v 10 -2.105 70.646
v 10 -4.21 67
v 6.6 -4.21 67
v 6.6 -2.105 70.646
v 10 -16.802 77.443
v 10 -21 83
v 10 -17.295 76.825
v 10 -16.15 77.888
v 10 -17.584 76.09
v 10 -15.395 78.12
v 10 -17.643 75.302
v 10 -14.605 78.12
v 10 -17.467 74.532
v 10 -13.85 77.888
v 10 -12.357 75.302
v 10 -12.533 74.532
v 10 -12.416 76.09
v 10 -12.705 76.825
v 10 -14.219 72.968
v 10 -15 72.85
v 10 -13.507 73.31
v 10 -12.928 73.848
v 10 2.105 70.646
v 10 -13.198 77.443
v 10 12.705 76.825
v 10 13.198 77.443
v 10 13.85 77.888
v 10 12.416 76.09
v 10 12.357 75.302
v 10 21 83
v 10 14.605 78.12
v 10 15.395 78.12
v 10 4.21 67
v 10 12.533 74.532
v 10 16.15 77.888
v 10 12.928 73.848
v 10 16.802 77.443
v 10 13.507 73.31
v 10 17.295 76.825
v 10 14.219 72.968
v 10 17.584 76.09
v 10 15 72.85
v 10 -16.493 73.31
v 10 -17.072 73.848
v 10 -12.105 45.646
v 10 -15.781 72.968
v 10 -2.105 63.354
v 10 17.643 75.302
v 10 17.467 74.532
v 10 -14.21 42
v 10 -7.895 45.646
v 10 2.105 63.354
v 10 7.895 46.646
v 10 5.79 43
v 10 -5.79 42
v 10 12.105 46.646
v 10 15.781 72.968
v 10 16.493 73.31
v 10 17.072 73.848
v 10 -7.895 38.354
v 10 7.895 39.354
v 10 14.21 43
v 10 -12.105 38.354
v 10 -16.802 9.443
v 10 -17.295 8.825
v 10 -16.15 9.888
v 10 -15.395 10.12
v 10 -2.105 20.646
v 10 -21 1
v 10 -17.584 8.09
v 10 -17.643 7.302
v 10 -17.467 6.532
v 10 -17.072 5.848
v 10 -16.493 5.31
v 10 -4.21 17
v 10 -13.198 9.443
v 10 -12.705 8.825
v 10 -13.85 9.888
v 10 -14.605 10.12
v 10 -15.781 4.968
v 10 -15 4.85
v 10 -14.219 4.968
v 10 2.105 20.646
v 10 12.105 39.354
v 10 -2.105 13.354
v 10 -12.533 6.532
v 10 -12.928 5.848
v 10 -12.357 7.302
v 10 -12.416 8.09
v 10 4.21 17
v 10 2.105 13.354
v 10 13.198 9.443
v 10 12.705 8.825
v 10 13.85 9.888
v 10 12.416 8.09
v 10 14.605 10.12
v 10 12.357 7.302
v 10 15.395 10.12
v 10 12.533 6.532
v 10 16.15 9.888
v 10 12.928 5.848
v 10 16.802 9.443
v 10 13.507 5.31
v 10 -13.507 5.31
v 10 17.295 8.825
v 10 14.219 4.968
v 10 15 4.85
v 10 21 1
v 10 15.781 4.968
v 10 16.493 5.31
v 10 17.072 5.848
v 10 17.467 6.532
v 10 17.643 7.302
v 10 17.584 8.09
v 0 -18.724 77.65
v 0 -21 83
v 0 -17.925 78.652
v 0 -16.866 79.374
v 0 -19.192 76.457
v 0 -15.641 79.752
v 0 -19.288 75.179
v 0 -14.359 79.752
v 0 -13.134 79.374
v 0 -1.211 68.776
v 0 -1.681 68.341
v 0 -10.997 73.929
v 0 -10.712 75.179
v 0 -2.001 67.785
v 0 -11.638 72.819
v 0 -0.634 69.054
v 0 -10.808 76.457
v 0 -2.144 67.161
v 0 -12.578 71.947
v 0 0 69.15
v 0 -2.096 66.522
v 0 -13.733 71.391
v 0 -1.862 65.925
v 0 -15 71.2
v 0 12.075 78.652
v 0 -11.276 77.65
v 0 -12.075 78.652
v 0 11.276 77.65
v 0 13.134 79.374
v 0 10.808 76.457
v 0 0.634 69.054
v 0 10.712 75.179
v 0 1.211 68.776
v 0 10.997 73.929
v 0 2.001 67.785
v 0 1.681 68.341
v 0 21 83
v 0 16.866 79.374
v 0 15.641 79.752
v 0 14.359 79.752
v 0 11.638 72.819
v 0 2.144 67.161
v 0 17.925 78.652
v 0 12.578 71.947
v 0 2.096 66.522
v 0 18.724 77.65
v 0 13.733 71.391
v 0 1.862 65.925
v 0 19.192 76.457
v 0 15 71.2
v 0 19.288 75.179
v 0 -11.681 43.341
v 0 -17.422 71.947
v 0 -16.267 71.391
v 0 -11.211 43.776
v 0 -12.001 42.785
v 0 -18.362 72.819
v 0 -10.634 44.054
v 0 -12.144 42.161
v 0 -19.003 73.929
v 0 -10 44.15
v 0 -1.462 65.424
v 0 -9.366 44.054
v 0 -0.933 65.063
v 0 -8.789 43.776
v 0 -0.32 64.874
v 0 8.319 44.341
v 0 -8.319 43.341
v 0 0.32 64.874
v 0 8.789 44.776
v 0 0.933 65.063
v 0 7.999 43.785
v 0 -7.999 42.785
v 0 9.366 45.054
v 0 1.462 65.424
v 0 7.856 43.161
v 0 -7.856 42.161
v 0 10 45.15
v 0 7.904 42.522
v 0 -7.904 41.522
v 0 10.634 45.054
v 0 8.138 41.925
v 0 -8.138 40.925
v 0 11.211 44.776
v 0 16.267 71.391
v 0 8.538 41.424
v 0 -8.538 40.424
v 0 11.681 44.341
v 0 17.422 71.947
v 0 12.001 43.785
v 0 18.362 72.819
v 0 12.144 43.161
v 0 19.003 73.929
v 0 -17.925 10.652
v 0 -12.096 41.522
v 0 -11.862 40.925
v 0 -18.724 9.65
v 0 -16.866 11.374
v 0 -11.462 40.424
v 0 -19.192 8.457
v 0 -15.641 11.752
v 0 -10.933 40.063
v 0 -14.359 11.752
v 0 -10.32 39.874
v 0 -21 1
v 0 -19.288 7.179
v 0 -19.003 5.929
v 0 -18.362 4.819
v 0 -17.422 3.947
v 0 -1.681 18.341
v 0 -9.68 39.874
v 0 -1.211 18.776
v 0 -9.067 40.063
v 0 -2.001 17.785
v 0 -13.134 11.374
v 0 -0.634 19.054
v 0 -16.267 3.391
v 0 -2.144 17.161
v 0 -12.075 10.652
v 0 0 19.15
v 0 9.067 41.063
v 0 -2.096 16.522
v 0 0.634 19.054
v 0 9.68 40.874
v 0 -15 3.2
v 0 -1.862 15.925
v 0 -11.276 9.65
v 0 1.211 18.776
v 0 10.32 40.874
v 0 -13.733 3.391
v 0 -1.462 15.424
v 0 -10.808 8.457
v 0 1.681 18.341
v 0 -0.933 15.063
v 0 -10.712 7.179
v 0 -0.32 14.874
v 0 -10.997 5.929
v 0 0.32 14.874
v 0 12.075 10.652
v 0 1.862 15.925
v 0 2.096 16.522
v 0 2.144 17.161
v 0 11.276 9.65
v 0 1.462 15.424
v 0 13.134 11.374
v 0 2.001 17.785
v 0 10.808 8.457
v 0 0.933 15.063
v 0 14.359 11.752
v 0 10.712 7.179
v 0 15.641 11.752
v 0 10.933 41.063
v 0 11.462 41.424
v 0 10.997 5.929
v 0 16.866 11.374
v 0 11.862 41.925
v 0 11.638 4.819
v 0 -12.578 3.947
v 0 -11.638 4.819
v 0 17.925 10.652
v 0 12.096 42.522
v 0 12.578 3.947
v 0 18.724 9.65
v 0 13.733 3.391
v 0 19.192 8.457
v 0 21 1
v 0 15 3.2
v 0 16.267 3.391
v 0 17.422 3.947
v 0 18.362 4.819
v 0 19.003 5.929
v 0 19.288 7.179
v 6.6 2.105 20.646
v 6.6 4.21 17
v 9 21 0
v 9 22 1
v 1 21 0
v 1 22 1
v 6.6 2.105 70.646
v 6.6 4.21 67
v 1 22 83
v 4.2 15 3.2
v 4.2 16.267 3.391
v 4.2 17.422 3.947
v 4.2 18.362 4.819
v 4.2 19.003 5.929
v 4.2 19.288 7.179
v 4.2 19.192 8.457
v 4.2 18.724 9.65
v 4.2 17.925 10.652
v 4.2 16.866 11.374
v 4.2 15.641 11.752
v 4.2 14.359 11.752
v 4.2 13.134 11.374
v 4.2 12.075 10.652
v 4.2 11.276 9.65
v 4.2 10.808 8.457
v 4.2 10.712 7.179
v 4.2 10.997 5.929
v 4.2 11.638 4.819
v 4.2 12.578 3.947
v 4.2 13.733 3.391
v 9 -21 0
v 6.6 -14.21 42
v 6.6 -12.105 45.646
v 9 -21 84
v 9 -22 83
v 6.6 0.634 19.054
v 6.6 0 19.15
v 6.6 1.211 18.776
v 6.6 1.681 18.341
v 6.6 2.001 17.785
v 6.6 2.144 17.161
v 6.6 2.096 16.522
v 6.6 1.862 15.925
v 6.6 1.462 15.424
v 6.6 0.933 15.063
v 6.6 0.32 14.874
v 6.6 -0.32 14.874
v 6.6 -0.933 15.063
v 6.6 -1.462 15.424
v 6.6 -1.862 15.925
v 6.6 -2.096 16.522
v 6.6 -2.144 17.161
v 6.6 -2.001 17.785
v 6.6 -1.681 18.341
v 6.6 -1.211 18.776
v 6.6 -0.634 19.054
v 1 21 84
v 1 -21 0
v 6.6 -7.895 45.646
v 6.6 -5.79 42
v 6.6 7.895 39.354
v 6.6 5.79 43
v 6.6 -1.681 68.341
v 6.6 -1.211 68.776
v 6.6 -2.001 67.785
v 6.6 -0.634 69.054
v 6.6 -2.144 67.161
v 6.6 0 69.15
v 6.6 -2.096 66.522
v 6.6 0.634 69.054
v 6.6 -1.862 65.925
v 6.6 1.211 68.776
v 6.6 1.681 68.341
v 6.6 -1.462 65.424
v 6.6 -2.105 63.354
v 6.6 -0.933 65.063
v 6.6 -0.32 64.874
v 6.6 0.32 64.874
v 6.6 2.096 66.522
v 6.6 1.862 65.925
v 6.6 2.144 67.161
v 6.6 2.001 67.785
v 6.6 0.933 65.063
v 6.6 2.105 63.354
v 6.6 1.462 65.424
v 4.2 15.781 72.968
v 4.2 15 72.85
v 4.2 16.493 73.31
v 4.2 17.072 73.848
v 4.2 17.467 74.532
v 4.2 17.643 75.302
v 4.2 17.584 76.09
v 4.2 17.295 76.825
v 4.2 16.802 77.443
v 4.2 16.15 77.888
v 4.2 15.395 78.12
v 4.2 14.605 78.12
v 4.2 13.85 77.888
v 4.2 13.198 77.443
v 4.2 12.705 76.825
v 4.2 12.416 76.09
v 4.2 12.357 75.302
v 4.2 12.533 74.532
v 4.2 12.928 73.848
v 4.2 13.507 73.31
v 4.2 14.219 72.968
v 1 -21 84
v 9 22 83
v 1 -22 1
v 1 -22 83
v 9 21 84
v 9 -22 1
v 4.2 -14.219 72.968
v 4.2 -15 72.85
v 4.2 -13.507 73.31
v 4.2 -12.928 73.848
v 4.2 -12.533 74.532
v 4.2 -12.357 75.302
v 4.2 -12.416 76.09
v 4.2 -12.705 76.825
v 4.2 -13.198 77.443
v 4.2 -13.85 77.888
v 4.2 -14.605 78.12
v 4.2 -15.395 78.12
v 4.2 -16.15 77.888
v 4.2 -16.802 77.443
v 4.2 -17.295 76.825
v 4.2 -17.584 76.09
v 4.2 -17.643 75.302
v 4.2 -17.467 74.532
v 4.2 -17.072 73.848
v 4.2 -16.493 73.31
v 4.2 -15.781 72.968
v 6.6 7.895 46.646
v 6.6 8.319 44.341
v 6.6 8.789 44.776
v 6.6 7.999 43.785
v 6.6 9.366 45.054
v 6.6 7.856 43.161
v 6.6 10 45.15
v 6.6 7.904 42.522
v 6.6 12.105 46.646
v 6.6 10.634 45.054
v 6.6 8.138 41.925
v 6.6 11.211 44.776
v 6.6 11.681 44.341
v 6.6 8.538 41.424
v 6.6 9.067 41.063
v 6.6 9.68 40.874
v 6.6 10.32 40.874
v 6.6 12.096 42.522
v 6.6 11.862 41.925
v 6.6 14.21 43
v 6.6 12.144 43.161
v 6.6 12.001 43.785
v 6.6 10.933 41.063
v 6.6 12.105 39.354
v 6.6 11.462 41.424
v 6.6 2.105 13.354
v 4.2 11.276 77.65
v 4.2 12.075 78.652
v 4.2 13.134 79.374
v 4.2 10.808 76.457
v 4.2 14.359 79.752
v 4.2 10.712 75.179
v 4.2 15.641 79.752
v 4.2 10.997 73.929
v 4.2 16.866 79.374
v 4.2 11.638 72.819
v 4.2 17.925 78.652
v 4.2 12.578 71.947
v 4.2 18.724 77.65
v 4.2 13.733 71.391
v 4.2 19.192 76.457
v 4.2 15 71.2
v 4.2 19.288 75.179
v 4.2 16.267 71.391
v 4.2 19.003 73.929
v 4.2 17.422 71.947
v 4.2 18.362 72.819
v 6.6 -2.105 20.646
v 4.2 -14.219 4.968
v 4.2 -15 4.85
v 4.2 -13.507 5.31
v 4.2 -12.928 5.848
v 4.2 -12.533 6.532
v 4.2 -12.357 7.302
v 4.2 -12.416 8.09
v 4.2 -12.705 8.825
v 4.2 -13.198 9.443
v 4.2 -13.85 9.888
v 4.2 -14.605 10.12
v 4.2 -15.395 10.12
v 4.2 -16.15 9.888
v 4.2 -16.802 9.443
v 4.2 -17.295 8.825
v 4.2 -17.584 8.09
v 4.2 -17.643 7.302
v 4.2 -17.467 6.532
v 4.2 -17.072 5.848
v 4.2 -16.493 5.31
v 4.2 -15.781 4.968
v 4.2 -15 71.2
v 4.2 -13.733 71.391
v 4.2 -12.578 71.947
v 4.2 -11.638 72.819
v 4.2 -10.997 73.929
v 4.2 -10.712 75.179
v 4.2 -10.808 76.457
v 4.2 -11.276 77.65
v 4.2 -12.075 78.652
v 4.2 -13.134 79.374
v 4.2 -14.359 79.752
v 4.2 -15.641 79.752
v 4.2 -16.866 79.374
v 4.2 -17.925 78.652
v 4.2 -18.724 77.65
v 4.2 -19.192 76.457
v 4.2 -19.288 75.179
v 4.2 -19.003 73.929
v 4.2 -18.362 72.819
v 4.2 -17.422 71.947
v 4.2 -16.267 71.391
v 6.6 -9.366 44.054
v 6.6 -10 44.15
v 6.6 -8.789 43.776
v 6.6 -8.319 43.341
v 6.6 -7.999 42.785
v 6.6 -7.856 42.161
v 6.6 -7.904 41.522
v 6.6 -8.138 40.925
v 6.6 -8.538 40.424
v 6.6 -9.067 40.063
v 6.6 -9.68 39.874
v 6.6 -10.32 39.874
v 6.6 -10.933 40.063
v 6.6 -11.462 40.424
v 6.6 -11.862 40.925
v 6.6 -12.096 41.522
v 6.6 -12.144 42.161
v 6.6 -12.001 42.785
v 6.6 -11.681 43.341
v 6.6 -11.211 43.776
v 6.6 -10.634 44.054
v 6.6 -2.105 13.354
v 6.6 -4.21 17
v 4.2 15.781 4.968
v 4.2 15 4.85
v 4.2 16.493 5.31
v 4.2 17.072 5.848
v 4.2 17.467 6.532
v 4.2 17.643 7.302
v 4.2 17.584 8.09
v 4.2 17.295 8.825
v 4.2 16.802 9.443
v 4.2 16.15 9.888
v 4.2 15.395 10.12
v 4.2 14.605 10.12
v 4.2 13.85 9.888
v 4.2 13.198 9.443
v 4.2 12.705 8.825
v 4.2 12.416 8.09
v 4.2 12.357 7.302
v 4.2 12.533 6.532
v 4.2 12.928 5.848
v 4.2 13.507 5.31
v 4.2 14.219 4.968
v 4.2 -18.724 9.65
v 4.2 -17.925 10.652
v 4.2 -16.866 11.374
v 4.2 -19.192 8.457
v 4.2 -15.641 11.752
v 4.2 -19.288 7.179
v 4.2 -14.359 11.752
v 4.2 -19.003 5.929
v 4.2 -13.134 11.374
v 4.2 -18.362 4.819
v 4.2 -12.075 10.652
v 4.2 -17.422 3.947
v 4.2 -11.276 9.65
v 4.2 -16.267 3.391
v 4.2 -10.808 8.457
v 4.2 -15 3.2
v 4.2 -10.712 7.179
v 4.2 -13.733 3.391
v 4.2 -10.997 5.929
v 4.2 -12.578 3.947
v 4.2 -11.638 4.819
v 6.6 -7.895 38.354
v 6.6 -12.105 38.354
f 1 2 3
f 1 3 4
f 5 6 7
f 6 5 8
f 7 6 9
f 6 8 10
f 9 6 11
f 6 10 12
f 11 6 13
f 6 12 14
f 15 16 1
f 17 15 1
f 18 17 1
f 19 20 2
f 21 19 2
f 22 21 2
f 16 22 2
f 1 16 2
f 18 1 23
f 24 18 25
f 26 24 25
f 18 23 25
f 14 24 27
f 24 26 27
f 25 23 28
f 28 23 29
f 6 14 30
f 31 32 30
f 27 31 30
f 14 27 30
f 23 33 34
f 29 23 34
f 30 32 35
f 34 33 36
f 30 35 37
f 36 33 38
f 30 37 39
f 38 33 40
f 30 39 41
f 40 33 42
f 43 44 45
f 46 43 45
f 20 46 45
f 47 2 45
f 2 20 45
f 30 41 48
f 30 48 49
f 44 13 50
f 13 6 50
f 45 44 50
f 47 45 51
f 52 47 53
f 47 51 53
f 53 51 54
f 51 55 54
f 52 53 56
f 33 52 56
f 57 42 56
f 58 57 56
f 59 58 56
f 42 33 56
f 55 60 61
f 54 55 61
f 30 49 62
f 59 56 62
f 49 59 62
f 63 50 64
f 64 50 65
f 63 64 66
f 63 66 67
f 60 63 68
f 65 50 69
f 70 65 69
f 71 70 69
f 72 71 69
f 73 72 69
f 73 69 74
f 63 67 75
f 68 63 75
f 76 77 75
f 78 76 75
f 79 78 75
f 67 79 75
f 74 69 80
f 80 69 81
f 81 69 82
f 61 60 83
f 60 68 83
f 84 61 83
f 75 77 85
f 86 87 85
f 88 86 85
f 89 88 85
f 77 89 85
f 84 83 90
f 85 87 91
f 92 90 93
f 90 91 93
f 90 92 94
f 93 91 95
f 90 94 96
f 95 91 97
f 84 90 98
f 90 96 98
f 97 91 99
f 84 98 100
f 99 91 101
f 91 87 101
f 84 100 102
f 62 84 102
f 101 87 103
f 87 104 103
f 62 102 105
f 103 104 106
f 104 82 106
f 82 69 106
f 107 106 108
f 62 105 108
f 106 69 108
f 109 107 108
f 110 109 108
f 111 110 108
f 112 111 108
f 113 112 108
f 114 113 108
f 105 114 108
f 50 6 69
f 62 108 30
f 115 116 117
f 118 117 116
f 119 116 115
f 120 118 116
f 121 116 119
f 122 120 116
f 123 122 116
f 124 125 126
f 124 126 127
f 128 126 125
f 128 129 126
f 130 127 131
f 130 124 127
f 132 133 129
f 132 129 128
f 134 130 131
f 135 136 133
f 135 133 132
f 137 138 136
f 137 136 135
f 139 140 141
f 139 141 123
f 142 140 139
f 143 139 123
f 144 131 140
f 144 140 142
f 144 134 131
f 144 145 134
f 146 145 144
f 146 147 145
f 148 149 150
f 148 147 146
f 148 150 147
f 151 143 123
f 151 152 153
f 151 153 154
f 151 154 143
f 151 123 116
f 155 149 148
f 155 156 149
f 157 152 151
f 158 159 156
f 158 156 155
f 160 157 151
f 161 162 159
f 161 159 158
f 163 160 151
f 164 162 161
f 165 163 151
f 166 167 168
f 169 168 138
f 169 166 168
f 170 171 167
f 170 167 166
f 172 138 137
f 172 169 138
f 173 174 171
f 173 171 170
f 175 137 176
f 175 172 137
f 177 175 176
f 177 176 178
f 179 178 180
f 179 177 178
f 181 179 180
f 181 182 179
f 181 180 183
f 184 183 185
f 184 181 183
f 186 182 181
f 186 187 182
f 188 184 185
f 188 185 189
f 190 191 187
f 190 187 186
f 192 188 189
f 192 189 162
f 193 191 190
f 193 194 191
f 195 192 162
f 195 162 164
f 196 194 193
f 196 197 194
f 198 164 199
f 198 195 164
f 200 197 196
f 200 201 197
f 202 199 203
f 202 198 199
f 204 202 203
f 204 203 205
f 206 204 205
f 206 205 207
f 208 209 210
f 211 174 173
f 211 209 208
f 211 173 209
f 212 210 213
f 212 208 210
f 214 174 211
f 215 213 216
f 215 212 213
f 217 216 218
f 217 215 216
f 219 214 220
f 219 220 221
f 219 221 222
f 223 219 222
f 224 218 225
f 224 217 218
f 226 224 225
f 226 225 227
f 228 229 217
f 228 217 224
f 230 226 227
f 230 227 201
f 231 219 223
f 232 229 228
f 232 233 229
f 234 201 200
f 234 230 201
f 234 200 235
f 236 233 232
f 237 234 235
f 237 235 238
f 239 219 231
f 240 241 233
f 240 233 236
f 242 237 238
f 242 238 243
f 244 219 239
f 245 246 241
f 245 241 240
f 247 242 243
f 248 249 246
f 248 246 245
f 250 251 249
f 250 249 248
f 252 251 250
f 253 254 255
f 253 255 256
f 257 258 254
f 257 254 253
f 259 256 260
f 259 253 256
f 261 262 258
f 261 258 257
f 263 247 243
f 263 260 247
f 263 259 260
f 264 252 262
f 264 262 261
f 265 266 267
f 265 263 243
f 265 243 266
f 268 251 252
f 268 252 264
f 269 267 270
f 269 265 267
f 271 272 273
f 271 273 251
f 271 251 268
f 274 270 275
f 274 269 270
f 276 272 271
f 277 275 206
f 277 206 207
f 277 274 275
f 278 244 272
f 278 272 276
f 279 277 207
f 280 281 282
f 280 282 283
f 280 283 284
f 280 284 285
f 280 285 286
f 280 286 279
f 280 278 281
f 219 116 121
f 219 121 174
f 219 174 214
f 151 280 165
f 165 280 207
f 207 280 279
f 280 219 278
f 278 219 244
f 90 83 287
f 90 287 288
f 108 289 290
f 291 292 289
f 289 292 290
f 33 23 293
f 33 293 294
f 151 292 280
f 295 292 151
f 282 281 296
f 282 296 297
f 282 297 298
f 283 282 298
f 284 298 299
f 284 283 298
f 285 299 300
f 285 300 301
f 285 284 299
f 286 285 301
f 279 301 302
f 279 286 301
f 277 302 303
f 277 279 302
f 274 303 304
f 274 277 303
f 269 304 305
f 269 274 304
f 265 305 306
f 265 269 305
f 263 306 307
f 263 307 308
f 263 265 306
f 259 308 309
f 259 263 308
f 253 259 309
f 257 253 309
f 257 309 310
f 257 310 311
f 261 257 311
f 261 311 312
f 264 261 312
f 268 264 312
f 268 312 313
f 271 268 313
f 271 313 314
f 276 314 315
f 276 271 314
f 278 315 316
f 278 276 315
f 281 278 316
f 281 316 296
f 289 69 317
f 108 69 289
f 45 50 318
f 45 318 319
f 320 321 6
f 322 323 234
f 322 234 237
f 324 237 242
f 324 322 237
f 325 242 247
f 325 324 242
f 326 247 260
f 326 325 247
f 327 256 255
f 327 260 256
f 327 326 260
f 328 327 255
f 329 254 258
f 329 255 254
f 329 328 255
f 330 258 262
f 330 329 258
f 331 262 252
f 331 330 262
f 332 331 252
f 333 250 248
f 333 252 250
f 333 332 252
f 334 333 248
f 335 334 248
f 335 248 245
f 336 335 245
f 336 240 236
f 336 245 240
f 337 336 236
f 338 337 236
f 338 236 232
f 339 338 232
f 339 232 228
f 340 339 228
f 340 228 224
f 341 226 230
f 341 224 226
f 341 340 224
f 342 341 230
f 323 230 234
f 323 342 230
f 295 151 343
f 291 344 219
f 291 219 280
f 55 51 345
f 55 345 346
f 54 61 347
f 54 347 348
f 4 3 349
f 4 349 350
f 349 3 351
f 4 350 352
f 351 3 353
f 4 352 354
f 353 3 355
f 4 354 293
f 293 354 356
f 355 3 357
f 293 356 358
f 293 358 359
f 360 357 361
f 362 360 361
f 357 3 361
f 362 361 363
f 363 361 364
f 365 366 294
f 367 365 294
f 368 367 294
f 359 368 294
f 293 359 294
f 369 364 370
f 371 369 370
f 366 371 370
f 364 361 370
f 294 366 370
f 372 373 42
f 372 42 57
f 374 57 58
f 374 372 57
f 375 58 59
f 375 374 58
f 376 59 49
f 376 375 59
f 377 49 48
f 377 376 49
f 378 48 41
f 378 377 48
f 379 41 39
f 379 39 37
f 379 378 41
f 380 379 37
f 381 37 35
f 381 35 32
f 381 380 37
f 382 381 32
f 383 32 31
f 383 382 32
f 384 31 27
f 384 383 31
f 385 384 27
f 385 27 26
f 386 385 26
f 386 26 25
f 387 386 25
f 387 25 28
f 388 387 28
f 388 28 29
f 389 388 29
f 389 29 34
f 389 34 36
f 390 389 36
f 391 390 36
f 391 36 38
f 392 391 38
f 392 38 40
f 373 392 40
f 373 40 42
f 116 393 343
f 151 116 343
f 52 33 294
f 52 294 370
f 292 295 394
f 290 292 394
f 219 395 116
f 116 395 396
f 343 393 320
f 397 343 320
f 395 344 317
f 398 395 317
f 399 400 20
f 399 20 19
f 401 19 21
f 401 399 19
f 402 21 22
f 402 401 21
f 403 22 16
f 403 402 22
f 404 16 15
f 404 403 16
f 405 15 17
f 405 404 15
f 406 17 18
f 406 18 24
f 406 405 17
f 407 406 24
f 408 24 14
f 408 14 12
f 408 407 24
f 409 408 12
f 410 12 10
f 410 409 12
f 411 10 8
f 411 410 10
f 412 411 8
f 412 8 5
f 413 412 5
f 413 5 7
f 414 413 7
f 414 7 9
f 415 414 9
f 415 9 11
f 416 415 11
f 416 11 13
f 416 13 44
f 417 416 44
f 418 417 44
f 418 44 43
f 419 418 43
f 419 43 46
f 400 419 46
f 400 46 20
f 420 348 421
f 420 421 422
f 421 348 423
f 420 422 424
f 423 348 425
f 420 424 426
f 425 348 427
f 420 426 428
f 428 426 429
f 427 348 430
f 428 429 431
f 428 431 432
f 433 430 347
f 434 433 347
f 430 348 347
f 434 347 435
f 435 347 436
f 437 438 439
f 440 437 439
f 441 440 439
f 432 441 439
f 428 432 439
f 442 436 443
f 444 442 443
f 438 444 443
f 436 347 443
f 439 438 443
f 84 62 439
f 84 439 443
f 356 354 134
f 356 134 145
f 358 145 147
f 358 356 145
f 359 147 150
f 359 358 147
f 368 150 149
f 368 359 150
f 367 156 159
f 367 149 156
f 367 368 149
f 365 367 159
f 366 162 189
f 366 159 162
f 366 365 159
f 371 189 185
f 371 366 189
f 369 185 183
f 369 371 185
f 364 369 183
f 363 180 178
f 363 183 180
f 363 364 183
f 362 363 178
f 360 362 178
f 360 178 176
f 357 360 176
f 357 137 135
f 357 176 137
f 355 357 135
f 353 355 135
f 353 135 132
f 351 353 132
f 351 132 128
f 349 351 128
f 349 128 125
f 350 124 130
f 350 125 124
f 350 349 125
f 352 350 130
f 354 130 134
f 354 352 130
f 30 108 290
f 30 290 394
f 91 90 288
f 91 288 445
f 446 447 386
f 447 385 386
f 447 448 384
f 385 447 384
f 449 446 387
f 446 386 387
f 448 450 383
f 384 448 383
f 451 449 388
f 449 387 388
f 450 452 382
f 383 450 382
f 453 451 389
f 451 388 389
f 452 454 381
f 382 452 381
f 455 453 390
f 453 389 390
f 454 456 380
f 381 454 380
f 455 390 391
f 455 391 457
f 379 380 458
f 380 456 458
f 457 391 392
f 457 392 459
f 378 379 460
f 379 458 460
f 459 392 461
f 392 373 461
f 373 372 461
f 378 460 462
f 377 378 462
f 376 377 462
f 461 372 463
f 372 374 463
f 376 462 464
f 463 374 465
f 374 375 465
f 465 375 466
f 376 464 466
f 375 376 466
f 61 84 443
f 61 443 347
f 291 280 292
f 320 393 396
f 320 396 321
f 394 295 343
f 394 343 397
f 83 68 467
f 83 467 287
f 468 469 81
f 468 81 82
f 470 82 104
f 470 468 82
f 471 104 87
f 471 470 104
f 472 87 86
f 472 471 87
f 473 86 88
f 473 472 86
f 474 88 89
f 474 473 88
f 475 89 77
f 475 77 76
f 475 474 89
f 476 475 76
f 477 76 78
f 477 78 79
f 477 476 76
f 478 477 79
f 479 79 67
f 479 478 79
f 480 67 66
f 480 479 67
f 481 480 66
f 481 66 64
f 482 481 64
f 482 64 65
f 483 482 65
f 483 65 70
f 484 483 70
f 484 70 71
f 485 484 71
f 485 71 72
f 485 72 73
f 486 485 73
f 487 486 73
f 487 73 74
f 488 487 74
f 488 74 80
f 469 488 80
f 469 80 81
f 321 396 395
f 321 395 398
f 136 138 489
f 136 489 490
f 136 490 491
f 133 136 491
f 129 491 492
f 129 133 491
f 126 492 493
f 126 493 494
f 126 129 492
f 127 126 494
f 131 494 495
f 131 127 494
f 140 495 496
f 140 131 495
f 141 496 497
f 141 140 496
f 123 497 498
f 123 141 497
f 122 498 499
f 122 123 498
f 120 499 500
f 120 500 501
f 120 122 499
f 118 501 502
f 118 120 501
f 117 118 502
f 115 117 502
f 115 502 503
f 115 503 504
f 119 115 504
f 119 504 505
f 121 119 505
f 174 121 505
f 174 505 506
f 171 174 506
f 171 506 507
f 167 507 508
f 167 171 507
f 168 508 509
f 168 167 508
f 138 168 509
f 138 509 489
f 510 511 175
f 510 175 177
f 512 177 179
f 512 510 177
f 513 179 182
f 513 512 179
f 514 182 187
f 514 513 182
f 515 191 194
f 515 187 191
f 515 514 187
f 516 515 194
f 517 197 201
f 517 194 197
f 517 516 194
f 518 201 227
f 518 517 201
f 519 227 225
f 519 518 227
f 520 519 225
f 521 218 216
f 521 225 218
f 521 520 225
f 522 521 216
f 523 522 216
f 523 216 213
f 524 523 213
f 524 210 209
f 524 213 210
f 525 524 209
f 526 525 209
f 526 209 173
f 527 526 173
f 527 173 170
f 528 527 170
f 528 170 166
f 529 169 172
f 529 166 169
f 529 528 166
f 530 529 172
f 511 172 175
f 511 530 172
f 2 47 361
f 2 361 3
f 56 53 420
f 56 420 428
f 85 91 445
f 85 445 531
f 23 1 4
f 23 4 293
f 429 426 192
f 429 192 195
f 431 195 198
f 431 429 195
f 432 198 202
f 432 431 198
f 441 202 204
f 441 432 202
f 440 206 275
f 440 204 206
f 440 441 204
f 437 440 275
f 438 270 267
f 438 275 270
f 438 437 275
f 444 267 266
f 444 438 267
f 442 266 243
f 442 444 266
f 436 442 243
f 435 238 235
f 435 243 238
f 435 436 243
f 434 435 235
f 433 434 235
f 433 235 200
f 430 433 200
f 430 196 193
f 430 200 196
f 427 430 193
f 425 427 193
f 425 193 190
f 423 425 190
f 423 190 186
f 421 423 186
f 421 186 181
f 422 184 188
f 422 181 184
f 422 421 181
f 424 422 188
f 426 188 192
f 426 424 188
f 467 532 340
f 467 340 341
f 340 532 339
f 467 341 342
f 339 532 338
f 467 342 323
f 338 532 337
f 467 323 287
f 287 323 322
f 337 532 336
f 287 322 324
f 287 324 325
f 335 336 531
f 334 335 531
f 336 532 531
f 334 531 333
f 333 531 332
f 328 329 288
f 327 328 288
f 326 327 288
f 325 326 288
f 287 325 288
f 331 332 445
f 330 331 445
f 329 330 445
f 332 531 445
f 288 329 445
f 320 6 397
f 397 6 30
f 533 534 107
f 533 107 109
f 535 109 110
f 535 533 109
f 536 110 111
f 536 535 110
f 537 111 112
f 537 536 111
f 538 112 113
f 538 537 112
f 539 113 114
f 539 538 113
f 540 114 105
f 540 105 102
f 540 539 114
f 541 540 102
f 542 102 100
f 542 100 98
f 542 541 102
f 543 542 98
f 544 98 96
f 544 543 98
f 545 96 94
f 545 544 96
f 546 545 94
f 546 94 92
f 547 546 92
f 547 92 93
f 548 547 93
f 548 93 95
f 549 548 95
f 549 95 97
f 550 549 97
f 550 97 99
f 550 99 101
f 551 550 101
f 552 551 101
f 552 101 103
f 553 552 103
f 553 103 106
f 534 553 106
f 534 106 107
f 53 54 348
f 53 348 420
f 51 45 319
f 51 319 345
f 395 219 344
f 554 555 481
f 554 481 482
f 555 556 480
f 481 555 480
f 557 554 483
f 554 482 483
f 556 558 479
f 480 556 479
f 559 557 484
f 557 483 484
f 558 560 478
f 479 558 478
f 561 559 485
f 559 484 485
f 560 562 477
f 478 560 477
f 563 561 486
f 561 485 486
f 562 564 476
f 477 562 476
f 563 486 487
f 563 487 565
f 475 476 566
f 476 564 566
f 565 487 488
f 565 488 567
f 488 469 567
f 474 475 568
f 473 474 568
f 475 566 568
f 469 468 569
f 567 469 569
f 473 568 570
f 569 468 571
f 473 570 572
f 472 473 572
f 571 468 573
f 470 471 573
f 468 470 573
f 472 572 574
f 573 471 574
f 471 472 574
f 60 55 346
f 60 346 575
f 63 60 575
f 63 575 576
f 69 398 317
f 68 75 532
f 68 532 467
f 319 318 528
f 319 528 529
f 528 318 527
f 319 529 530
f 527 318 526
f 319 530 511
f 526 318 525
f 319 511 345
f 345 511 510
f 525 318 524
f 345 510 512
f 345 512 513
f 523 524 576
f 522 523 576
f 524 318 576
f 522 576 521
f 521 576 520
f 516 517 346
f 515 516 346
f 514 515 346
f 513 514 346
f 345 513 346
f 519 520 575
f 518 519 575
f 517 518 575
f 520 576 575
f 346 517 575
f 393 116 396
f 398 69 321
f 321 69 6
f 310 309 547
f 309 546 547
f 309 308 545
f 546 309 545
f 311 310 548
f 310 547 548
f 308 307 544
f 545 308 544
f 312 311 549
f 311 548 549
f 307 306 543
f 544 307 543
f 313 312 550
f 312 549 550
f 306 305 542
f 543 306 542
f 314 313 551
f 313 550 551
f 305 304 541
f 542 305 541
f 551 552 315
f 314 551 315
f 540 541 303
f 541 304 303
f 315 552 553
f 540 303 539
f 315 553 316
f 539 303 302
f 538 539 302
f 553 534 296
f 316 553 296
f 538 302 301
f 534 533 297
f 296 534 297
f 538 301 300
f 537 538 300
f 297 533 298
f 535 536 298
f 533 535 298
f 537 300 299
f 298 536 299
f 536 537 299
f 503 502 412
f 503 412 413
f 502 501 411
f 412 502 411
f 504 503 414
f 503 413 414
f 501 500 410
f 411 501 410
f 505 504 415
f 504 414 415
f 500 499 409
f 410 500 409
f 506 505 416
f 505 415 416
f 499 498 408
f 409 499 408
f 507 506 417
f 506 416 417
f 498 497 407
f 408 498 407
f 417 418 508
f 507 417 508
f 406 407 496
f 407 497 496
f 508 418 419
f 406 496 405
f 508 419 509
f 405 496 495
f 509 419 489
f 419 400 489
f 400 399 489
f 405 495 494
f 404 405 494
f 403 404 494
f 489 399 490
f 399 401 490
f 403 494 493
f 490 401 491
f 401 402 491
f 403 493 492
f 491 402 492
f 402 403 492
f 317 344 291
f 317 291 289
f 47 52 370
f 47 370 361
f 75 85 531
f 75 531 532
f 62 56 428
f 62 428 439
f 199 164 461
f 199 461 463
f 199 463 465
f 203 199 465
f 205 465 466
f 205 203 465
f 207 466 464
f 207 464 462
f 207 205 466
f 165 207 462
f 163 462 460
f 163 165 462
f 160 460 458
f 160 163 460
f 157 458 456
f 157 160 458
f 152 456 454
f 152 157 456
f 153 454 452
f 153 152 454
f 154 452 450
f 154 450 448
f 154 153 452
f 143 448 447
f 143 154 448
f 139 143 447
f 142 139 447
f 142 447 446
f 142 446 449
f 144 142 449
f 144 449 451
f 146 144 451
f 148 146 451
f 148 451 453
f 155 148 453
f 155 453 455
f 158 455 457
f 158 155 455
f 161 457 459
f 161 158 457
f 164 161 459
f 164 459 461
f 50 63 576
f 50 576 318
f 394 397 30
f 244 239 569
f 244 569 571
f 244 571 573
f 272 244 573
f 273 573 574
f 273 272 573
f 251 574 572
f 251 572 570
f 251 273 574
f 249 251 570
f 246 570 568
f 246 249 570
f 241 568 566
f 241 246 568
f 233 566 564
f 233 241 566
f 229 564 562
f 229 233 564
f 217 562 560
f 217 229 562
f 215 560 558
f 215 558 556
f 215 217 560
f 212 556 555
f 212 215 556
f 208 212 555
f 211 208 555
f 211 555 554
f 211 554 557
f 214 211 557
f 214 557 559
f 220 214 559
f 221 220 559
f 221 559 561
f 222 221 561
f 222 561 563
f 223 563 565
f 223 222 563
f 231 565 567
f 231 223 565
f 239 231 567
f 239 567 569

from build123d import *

# Parameters (mm, degrees)
CYLINDER014005946_R                                     = 2.65
CYLINDER014005946_DEPTH                                 = 10
CYLINDER014005947_R                                     = 2.65
CYLINDER014005947_DEPTH                                 = 10
CYLINDER014005948_R                                     = 2.65
CYLINDER014005948_DEPTH                                 = 10
CYLINDER014005949_R                                     = 4.3
CYLINDER014005949_DEPTH                                 = 4.2
CYLINDER014005950_R                                     = 4.3
CYLINDER014005950_DEPTH                                 = 4.2
CYLINDER014005951_R                                     = 4.3
CYLINDER014005951_DEPTH                                 = 4.2
CYLINDER014005952_R                                     = 4.3
CYLINDER014005952_DEPTH                                 = 4.2
PRISM015_DEPTH                                          = 3.4
CYLINDER014005953_R                                     = 2.15
CYLINDER014005953_DEPTH                                 = 16
FUSION001089102007007003008034028016007_PLACEMENT_ANGLE = 90
CYLINDER014005945_R                                     = 2.65
CYLINDER014005945_DEPTH                                 = 10
BOX021003_W                                             = 10
BOX021003_H                                             = 44
BOX021003_DEPTH                                         = 84
CHAMFER018_SIZE                                         = 1


with BuildPart() as v_lec856:
    # Cylinder014005946 → Cylinder014005946 (new body)
    with BuildSketch(Plane(origin=(0, 15, 7.5), x_dir=(0, 0, -1), z_dir=(1, 0, 0))):
        Circle(CYLINDER014005946_R)
    extrude(amount=CYLINDER014005946_DEPTH)


with BuildPart() as v_lec857:
    # Cylinder014005947 → Cylinder014005947 (new body)
    with BuildSketch(Plane(origin=(0, -15, 75.5), x_dir=(0, 0, -1), z_dir=(1, 0, 0))):
        Circle(CYLINDER014005947_R)
    extrude(amount=CYLINDER014005947_DEPTH)


with BuildPart() as v_lec858:
    # Cylinder014005948 → Cylinder014005948 (new body)
    with BuildSketch(Plane(origin=(0, 15, 75.5), x_dir=(0, 0, -1), z_dir=(1, 0, 0))):
        Circle(CYLINDER014005948_R)
    extrude(amount=CYLINDER014005948_DEPTH)


with BuildPart() as v_lec859:
    # Cylinder014005949 → Cylinder014005949 (new body)
    with BuildSketch(Plane(origin=(0, -15, 7.5), x_dir=(0, 0, -1), z_dir=(1, 0, 0))):
        Circle(CYLINDER014005949_R)
    extrude(amount=CYLINDER014005949_DEPTH)


with BuildPart() as v_lec860:
    # Cylinder014005950 → Cylinder014005950 (new body)
    with BuildSketch(Plane(origin=(0, 15, 7.5), x_dir=(0, 0, -1), z_dir=(1, 0, 0))):
        Circle(CYLINDER014005950_R)
    extrude(amount=CYLINDER014005950_DEPTH)


with BuildPart() as v_lec861:
    # Cylinder014005951 → Cylinder014005951 (new body)
    with BuildSketch(Plane(origin=(0, -15, 75.5), x_dir=(0, 0, -1), z_dir=(1, 0, 0))):
        Circle(CYLINDER014005951_R)
    extrude(amount=CYLINDER014005951_DEPTH)


with BuildPart() as v_lec862:
    # Cylinder014005952 → Cylinder014005952 (new body)
    with BuildSketch(Plane(origin=(0, 15, 75.5), x_dir=(0, 0, -1), z_dir=(1, 0, 0))):
        Circle(CYLINDER014005952_R)
    extrude(amount=CYLINDER014005952_DEPTH)


with BuildPart() as m4x007:
    # prism015 → prism015 (new body)
    with BuildSketch(Plane(origin=(0, 0, 0), x_dir=(0, 1, 0), z_dir=(0, 0, 1))):
        Polygon((4.21, 0), (2.105, 3.645967), (-2.105, 3.645967), (-4.21, 0), (-2.105, -3.645967), (2.105, -3.645967), align=None)
    extrude(amount=PRISM015_DEPTH)


with BuildPart() as m4nut025:
    # Cylinder014005953 → Cylinder014005953 (new body)
    with BuildSketch(Plane.XY):
        Circle(CYLINDER014005953_R)
    extrude(amount=CYLINDER014005953_DEPTH)

    # Fusion001089102007007003008034028016007: union M4X007
    add(m4x007.part)


with BuildPart() as m4nut025_1:
    # Fusion001089102007007003008034028016007 placement: moved
    add(m4nut025.part.moved(Location((10, 0, 42))).rotate(Axis((10, 0, 42), (0, -1, 0)), FUSION001089102007007003008034028016007_PLACEMENT_ANGLE))


with BuildPart() as m4nut026:
    # Fusion001089102007007003008034028016007001 base: copy of M4nut025
    add(m4nut025_1.part)


with BuildPart() as m4nut026_1:
    # Fusion001089102007007003008034028016007001 placement: moved
    add(m4nut026.part.moved(Location((0, 10, 1))))


with BuildPart() as m4nut027:
    # Fusion001089102007007003008034028016007002 base: copy of M4nut025
    add(m4nut025_1.part)


with BuildPart() as m4nut027_1:
    # Fusion001089102007007003008034028016007002 placement: moved
    add(m4nut027.part.moved(Location((0, -10, 0))))


with BuildPart() as m4nut029:
    # Fusion001089102007007003008034028016007004 base: copy of M4nut025
    add(m4nut025_1.part)


with BuildPart() as m4nut029_1:
    # Fusion001089102007007003008034028016007004 placement: moved
    add(m4nut029.part.moved(Location((0, 0, -25))))


with BuildPart() as m4nut028:
    # Fusion001089102007007003008034028016007003 base: copy of M4nut025
    add(m4nut025_1.part)


with BuildPart() as m4nut028_1:
    # Fusion001089102007007003008034028016007003 placement: moved
    add(m4nut028.part.moved(Location((0, 0, 25))))


with BuildPart() as fusion001089102007007003008034028016006:
    # Cylinder014005945 → Cylinder014005945 (new body)
    with BuildSketch(Plane(origin=(0, -15, 7.5), x_dir=(0, 0, -1), z_dir=(1, 0, 0))):
        Circle(CYLINDER014005945_R)
    extrude(amount=CYLINDER014005945_DEPTH)

    # Fusion001089102007007003008034028016006: union Válec856, Válec857, Válec858, Válec859, Válec860, Válec861, Válec862, M4nut026, M4nut027, M4nut029, M4nut028
    add(v_lec856.part)
    add(v_lec857.part)
    add(v_lec858.part)
    add(v_lec859.part)
    add(v_lec860.part)
    add(v_lec861.part)
    add(v_lec862.part)
    add(m4nut026_1.part)
    add(m4nut027_1.part)
    add(m4nut029_1.part)
    add(m4nut028_1.part)


with BuildPart() as chamfer018:
    # Box021003 → Box021003 (new body)
    with BuildSketch(Plane(origin=(0, -22, 0), x_dir=(1, 0, 0), z_dir=(0, 0, 1))):
        with Locations((5, 22)):
            Rectangle(BOX021003_W, BOX021003_H)
    extrude(amount=BOX021003_DEPTH)

    # Cut009003003009003003003007003002002: cut Fusion001089102007007003008034028016006
    add(fusion001089102007007003008034028016006.part, mode=Mode.SUBTRACT)

    # Chamfer018
    chamfer018_edges = [chamfer018.edges().sort_by_distance(p)[0] for p in [
        (0, -22, 42),
        (0, 0, 84),
        (0, 0, 0),
        (0, 22, 42),
        (5, -22, 0),
        (10, -22, 42),
        (5, -22, 84),
        (5, 22, 84),
        (10, 0, 84),
        (5, 22, 0),
        (10, 0, 0),
        (10, 22, 42),
    ]]
    chamfer(chamfer018_edges, length=CHAMFER018_SIZE)


solid = chamfer018.part
